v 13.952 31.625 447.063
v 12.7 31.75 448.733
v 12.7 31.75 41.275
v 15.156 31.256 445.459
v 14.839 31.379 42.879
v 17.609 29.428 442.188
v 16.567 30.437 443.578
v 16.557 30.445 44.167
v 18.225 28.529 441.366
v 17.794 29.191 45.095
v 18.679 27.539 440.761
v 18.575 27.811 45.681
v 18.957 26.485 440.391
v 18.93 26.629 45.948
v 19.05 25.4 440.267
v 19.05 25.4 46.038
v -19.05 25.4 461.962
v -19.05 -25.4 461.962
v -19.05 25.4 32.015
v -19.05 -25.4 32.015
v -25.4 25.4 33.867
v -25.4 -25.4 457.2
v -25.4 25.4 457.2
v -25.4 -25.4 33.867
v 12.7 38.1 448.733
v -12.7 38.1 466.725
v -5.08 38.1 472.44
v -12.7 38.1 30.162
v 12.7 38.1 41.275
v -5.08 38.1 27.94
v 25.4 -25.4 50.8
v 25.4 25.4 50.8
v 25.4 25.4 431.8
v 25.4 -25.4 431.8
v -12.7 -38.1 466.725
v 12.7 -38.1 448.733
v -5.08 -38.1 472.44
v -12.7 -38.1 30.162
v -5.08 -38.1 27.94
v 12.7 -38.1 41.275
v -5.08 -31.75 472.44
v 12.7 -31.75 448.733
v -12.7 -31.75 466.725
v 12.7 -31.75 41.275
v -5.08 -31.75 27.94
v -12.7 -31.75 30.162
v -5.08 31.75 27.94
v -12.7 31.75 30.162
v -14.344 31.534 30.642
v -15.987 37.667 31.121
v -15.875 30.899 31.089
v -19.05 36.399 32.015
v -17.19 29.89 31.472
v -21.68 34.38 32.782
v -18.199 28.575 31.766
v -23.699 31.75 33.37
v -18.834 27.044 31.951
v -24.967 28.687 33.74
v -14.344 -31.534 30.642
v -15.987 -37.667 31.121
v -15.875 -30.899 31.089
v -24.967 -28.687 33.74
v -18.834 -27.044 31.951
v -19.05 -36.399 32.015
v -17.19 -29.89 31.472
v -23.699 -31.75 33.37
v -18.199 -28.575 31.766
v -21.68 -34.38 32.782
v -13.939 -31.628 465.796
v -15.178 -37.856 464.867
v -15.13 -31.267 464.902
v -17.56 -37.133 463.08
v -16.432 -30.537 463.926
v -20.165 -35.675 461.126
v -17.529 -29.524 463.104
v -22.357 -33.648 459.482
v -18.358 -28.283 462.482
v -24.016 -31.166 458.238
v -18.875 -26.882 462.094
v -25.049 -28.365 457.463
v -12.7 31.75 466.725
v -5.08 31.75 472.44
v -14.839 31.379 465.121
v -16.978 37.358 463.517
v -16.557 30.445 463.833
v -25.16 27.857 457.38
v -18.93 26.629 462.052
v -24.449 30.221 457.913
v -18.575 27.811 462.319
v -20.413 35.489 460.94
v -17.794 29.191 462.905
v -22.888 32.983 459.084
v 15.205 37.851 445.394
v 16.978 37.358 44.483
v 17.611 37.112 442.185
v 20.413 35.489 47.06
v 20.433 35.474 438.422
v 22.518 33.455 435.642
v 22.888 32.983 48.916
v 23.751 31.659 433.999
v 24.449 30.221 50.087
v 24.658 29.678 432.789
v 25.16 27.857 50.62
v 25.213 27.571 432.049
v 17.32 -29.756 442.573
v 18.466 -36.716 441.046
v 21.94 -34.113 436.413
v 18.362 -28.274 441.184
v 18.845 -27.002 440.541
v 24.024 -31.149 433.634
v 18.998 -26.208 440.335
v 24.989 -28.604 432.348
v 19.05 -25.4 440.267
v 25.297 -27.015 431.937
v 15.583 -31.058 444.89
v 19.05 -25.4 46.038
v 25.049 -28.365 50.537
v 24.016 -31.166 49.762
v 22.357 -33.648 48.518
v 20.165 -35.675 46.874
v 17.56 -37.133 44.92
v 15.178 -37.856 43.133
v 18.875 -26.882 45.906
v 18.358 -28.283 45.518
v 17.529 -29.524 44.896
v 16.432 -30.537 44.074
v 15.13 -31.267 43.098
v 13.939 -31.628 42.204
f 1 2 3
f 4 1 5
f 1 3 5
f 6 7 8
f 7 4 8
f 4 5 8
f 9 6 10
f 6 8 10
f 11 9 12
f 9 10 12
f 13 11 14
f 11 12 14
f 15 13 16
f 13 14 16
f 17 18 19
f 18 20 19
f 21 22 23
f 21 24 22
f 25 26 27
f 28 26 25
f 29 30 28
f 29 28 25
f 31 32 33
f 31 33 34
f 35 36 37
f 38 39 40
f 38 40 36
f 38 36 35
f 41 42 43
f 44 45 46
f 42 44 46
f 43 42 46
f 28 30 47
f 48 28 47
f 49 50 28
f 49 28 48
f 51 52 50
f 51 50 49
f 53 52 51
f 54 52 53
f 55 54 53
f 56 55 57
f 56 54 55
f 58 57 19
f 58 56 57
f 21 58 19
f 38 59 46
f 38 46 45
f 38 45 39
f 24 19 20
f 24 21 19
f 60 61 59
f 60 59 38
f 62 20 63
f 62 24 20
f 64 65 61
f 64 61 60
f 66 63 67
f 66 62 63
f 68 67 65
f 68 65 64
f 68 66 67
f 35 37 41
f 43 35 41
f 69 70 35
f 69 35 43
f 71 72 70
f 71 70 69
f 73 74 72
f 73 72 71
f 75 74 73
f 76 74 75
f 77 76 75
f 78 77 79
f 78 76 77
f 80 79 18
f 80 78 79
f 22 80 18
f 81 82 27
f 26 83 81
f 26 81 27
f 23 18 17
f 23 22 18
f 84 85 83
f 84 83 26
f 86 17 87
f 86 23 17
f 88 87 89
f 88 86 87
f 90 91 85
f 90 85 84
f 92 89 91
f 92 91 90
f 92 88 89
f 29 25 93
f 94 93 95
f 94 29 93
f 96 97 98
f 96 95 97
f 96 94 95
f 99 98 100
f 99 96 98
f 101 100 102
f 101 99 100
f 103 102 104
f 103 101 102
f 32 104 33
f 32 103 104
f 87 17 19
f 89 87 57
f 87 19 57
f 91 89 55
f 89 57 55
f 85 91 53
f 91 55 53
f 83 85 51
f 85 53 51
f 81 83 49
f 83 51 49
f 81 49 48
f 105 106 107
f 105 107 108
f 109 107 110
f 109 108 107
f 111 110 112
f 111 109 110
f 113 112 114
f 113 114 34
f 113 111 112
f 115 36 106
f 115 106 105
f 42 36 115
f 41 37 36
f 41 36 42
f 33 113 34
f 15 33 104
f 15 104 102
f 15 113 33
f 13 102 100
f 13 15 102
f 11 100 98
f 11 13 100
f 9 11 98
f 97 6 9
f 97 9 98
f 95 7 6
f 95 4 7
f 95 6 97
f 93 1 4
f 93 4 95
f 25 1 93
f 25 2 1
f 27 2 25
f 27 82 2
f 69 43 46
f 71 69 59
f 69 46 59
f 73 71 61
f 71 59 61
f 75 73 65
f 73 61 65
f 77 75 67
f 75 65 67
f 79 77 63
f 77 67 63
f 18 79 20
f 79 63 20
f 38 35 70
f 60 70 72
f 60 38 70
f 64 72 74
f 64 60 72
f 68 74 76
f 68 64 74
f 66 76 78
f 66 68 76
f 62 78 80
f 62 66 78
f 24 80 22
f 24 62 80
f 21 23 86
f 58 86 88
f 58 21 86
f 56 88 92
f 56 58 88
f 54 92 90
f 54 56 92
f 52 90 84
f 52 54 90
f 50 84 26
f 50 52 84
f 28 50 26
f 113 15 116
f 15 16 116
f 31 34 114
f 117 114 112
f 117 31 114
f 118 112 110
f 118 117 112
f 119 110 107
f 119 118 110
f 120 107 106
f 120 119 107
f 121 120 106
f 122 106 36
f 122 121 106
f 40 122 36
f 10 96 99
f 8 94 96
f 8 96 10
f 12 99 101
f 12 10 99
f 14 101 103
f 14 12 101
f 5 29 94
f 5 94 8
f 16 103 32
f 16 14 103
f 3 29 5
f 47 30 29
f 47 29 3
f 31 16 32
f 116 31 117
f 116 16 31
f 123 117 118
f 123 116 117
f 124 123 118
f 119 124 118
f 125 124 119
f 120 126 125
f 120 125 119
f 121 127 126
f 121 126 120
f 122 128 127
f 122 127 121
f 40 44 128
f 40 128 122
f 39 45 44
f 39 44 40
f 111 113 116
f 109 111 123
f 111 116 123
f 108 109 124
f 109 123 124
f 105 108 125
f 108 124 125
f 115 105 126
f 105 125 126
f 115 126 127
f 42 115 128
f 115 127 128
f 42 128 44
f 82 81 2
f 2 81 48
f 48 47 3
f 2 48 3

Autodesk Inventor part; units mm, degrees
ref_plane "Start Plane" through (0, 0, 27.94) normal (0, 0, 1) x (1, 0, 0)
ref_plane "End Plane" through (0, 0, 472.44) normal (0, 0, 1) x (1, 0, 0)
sketch "Sketch" plane through (0, 0, 0) normal (0, 0, 1) x (1, 0, 0)
  line L0 (-25.4, -25.4) -> (-25.4, 25.4)
  line L1 (-12.7, 38.1) -> (12.7, 38.1)
  line L2 (25.4, 25.4) -> (25.4, -25.4)
  line L3 (12.7, -38.1) -> (-12.7, -38.1)
  arc A0 (-25.4, -25.4) -> (-12.7, -38.1) centre (-12.7, -25.4) ccw
  arc A1 (-12.7, 38.1) -> (-25.4, 25.4) centre (-12.7, 25.4) ccw
  arc A2 (25.4, 25.4) -> (12.7, 38.1) centre (12.7, 25.4) ccw
  arc A3 (12.7, -38.1) -> (25.4, -25.4) centre (12.7, -25.4) ccw
  arc A4 (-12.7, 31.75) -> (-19.05, 25.4) centre (-12.7, 25.4) ccw
  line L4 (-12.7, 31.75) -> (12.7, 31.75)
  arc A5 (19.05, 25.4) -> (12.7, 31.75) centre (12.7, 25.4) ccw
  line L5 (19.05, 25.4) -> (19.05, -25.4)
  arc A6 (12.7, -31.75) -> (19.05, -25.4) centre (12.7, -25.4) ccw
  line L6 (12.7, -31.75) -> (-12.7, -31.75)
  arc A7 (-19.05, -25.4) -> (-12.7, -31.75) centre (-12.7, -25.4) ccw
  line L7 (-19.05, -25.4) -> (-19.05, 25.4)
  line L8 (0, 57.0224) -> (0, -57.0224) construction
  line L9 (-39.2424, 0) -> (39.2424, 0) construction
  dimension "d10" = 76.2
  dimension "d11" = 50.8
  dimension "d12" = 6.35
  dimension "d15" = 38.1
  dimension "d16" = 25.4
  dimension "d17" = 12.7
extrude "Body" add sketch "Sketch" along normal up to surface (444.5 mm away) from surface at 27.94
sketch "Sketch3" plane through (0, 0, 0) normal (0, 0, 1) x (1, 0, 0)
  line L0 (0, 0) -> (10, 0)
ref_plane "Work Plane3" through (0, 0, 0) normal (0, -1, 0) x (1, 0, 0)
ref_plane "Work Plane4" through (259.08, -25.4, 670.56) normal (-0.6, 0, 0.8) x (0.8, 0, 0.6)
split "Split1" plane through (259.08, -25.4, 670.56) removes the side toward (-0.6, 0, 0.8)
ref_plane "Work Plane5" through (-259.08, -25.4, -162.56) normal (0.6, 0, -0.8) x (-0.8, 0, -0.6)
split "Split2" plane through (-259.08, -25.4, -162.56) removes the side toward (0.6, 0, -0.8)
ref_plane "Work Plane6" through (223.52, -25.4, 167.64) normal (0.8, 0, 0.6) x (0.6, 0, -0.8)
split "Split3" plane through (223.52, -25.4, 167.64) removes the side toward (0.8, 0, 0.6)
ref_plane "Work Plane7" through (-480.568, -25.4, 166.624) normal (-0.28, 0, -0.96) x (-0.96, 0, 0.28)
split "Split4" plane through (-480.568, -25.4, 166.624) removes the side toward (-0.28, 0, -0.96)
sketch "Sketch4" plane through (0, 0, 0) normal (0, -1, 0) x (1, 0, 0)
  line L0 (-2, 27.94) -> (12, 27.94) projected
  line L1 (-2, 472.44) -> (12, 472.44) projected
  dimension "d19" = 444.5
equation "\"d10\" = G_H"
equation "\"d11\" = G_W"
equation "\"d12\" = G_T"
equation "\"d15\" = 0.5 * d10"
equation "\"d16\" = 0.5 * d11"
equation "\"d17\" = G_IR"
equation "\"d3\" = G_L"
equation "\"G_W\" = 50.8"
equation "\"G_H\" = 76.2"
equation "\"G_T\" = 6.35"
equation "\"G_IR\" = 12.7"
equation "\"G_L\" = d19"
equation "\"G_OFFSET_START\" = -27.94"
equation "\"G_OFFSET_END\" = -35.56"
equation "\"d13\" = -G_OFFSET_START"
equation "\"d14\" = G_OFFSET_END + B_L"
equation "\"B_L\" = 508"
properties part number "AISC - 3 x 2 x 1/4 - 17.5" material "Steel, Mild"
